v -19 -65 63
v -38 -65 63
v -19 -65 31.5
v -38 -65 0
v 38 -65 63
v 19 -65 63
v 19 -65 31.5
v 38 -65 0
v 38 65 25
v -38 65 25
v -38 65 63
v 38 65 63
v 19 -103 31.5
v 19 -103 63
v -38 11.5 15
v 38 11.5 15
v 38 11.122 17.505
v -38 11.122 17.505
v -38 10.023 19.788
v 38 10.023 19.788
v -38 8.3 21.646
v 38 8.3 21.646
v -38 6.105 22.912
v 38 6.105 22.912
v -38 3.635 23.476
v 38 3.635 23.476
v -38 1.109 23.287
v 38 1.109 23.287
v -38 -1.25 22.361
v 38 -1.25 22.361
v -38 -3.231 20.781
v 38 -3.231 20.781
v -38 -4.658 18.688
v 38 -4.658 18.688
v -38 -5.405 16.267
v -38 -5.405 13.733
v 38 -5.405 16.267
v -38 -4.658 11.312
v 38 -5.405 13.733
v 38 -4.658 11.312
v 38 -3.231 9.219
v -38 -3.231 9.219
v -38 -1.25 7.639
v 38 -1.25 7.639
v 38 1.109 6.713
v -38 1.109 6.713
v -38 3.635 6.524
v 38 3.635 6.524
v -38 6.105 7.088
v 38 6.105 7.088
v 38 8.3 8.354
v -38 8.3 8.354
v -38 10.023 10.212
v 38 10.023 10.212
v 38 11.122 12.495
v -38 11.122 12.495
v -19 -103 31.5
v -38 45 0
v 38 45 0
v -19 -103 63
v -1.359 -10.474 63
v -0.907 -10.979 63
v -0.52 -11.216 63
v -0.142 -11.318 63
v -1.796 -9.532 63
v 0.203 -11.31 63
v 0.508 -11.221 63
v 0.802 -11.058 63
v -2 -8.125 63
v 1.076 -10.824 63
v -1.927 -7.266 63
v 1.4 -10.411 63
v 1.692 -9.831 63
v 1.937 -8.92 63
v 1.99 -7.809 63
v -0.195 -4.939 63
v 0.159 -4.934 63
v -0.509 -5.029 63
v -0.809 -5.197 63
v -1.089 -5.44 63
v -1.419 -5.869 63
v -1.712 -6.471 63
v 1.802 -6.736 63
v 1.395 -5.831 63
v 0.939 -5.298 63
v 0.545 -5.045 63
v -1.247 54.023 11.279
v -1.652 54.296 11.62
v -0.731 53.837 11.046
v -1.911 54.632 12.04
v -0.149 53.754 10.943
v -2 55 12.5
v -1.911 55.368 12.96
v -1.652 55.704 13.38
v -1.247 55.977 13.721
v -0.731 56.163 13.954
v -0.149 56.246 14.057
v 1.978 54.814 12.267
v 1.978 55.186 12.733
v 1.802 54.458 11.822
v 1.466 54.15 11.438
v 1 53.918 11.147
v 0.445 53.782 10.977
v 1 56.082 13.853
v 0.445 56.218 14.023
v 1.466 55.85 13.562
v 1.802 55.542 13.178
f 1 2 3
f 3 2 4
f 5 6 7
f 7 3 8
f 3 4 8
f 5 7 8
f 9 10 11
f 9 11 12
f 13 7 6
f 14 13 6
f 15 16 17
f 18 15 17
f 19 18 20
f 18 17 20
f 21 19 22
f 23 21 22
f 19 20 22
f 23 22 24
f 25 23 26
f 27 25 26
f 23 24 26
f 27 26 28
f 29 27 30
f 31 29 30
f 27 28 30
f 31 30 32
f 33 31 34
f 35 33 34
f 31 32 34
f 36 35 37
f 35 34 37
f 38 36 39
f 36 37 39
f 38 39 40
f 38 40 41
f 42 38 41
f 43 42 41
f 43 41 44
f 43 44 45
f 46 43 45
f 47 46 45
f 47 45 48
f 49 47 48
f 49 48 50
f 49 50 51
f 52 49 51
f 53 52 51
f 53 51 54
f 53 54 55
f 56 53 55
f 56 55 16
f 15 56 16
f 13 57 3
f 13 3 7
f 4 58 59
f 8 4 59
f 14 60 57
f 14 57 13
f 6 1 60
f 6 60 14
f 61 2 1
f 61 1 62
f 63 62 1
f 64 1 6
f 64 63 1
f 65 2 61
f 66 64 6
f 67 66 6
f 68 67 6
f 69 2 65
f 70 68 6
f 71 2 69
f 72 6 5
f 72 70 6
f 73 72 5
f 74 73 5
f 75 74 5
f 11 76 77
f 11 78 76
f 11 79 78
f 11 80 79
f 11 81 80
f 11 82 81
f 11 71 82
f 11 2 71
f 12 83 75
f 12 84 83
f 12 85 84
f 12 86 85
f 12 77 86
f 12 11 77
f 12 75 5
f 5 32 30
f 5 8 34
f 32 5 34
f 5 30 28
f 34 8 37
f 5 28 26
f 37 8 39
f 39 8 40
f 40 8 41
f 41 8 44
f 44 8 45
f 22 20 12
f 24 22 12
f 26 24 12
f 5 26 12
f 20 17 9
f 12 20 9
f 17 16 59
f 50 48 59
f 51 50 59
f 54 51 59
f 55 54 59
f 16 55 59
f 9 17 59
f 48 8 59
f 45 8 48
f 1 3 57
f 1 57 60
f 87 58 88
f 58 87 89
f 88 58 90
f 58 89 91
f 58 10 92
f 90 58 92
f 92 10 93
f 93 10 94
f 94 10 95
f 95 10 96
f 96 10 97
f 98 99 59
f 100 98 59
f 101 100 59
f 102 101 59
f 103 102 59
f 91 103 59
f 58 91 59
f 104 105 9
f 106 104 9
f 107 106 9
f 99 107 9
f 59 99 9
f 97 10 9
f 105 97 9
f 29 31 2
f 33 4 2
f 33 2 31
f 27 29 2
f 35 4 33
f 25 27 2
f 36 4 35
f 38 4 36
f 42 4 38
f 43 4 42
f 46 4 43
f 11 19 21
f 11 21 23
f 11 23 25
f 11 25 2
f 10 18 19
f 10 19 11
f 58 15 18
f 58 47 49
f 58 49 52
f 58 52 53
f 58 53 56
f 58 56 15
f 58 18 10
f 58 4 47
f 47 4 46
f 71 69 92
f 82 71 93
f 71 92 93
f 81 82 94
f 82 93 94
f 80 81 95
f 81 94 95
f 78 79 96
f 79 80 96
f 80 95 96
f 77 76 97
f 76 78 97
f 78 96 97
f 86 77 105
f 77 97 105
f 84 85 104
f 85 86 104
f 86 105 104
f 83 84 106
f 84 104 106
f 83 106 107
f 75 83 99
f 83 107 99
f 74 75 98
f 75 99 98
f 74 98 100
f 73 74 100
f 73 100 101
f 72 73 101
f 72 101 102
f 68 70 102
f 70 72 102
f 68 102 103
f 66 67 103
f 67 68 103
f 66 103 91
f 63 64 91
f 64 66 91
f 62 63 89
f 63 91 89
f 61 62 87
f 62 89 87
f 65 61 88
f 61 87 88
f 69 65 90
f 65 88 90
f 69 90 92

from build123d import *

# Parameters (mm, degrees)
F0_W     = 76
F0_H     = 130
F1_DEPTH = 63
F2_SIZE2 = 25
F2_SIZE  = 20
F3_R     = 2
F4_DEPTH = 125.2523570347
F5_R     = 8.5
F6_DEPTH = 76.001
F7_W     = 38
F7_H     = 31.5
F8_DEPTH = 38


with BuildPart() as f1:
    # F0 (on Top) → F1 (new body)
    with BuildSketch(Plane.XY):
        Rectangle(F0_W, F0_H)
    extrude(amount=F1_DEPTH)

    # F2
    f2_edges = [f1.edges().sort_by_distance(p)[0] for p in [
        (0, 65, 0),
    ]]
    f2_side = f1.faces().sort_by_distance((0, 0, 0))[0]
    chamfer(f2_edges, length=F2_SIZE, length2=F2_SIZE2, reference=f2_side)

    # F3 (on face) → F4 (cut, through all)
    with BuildSketch(Plane(origin=(0, 27.4390243902, -21.9512195122), x_dir=(-1, 0, 0), z_dir=(0, 0.7808688094, -0.6246950476))):
        with Locations((0, 44.1190877335)):
            Circle(F3_R)
    extrude(amount=-F4_DEPTH, mode=Mode.SUBTRACT)

    # F5 (on face) → F6 (cut, through all)
    with BuildSketch(Plane.YZ.offset(38)):
        with Locations((3, 15)):
            Circle(F5_R)
    extrude(amount=-F6_DEPTH, mode=Mode.SUBTRACT)

    # F7 (on face) → F8 (join)
    with BuildSketch(Plane.XZ.offset(65)):
        with Locations((0, 47.25)):
            Rectangle(F7_W, F7_H)
    extrude(amount=F8_DEPTH)


solid = f1.part
